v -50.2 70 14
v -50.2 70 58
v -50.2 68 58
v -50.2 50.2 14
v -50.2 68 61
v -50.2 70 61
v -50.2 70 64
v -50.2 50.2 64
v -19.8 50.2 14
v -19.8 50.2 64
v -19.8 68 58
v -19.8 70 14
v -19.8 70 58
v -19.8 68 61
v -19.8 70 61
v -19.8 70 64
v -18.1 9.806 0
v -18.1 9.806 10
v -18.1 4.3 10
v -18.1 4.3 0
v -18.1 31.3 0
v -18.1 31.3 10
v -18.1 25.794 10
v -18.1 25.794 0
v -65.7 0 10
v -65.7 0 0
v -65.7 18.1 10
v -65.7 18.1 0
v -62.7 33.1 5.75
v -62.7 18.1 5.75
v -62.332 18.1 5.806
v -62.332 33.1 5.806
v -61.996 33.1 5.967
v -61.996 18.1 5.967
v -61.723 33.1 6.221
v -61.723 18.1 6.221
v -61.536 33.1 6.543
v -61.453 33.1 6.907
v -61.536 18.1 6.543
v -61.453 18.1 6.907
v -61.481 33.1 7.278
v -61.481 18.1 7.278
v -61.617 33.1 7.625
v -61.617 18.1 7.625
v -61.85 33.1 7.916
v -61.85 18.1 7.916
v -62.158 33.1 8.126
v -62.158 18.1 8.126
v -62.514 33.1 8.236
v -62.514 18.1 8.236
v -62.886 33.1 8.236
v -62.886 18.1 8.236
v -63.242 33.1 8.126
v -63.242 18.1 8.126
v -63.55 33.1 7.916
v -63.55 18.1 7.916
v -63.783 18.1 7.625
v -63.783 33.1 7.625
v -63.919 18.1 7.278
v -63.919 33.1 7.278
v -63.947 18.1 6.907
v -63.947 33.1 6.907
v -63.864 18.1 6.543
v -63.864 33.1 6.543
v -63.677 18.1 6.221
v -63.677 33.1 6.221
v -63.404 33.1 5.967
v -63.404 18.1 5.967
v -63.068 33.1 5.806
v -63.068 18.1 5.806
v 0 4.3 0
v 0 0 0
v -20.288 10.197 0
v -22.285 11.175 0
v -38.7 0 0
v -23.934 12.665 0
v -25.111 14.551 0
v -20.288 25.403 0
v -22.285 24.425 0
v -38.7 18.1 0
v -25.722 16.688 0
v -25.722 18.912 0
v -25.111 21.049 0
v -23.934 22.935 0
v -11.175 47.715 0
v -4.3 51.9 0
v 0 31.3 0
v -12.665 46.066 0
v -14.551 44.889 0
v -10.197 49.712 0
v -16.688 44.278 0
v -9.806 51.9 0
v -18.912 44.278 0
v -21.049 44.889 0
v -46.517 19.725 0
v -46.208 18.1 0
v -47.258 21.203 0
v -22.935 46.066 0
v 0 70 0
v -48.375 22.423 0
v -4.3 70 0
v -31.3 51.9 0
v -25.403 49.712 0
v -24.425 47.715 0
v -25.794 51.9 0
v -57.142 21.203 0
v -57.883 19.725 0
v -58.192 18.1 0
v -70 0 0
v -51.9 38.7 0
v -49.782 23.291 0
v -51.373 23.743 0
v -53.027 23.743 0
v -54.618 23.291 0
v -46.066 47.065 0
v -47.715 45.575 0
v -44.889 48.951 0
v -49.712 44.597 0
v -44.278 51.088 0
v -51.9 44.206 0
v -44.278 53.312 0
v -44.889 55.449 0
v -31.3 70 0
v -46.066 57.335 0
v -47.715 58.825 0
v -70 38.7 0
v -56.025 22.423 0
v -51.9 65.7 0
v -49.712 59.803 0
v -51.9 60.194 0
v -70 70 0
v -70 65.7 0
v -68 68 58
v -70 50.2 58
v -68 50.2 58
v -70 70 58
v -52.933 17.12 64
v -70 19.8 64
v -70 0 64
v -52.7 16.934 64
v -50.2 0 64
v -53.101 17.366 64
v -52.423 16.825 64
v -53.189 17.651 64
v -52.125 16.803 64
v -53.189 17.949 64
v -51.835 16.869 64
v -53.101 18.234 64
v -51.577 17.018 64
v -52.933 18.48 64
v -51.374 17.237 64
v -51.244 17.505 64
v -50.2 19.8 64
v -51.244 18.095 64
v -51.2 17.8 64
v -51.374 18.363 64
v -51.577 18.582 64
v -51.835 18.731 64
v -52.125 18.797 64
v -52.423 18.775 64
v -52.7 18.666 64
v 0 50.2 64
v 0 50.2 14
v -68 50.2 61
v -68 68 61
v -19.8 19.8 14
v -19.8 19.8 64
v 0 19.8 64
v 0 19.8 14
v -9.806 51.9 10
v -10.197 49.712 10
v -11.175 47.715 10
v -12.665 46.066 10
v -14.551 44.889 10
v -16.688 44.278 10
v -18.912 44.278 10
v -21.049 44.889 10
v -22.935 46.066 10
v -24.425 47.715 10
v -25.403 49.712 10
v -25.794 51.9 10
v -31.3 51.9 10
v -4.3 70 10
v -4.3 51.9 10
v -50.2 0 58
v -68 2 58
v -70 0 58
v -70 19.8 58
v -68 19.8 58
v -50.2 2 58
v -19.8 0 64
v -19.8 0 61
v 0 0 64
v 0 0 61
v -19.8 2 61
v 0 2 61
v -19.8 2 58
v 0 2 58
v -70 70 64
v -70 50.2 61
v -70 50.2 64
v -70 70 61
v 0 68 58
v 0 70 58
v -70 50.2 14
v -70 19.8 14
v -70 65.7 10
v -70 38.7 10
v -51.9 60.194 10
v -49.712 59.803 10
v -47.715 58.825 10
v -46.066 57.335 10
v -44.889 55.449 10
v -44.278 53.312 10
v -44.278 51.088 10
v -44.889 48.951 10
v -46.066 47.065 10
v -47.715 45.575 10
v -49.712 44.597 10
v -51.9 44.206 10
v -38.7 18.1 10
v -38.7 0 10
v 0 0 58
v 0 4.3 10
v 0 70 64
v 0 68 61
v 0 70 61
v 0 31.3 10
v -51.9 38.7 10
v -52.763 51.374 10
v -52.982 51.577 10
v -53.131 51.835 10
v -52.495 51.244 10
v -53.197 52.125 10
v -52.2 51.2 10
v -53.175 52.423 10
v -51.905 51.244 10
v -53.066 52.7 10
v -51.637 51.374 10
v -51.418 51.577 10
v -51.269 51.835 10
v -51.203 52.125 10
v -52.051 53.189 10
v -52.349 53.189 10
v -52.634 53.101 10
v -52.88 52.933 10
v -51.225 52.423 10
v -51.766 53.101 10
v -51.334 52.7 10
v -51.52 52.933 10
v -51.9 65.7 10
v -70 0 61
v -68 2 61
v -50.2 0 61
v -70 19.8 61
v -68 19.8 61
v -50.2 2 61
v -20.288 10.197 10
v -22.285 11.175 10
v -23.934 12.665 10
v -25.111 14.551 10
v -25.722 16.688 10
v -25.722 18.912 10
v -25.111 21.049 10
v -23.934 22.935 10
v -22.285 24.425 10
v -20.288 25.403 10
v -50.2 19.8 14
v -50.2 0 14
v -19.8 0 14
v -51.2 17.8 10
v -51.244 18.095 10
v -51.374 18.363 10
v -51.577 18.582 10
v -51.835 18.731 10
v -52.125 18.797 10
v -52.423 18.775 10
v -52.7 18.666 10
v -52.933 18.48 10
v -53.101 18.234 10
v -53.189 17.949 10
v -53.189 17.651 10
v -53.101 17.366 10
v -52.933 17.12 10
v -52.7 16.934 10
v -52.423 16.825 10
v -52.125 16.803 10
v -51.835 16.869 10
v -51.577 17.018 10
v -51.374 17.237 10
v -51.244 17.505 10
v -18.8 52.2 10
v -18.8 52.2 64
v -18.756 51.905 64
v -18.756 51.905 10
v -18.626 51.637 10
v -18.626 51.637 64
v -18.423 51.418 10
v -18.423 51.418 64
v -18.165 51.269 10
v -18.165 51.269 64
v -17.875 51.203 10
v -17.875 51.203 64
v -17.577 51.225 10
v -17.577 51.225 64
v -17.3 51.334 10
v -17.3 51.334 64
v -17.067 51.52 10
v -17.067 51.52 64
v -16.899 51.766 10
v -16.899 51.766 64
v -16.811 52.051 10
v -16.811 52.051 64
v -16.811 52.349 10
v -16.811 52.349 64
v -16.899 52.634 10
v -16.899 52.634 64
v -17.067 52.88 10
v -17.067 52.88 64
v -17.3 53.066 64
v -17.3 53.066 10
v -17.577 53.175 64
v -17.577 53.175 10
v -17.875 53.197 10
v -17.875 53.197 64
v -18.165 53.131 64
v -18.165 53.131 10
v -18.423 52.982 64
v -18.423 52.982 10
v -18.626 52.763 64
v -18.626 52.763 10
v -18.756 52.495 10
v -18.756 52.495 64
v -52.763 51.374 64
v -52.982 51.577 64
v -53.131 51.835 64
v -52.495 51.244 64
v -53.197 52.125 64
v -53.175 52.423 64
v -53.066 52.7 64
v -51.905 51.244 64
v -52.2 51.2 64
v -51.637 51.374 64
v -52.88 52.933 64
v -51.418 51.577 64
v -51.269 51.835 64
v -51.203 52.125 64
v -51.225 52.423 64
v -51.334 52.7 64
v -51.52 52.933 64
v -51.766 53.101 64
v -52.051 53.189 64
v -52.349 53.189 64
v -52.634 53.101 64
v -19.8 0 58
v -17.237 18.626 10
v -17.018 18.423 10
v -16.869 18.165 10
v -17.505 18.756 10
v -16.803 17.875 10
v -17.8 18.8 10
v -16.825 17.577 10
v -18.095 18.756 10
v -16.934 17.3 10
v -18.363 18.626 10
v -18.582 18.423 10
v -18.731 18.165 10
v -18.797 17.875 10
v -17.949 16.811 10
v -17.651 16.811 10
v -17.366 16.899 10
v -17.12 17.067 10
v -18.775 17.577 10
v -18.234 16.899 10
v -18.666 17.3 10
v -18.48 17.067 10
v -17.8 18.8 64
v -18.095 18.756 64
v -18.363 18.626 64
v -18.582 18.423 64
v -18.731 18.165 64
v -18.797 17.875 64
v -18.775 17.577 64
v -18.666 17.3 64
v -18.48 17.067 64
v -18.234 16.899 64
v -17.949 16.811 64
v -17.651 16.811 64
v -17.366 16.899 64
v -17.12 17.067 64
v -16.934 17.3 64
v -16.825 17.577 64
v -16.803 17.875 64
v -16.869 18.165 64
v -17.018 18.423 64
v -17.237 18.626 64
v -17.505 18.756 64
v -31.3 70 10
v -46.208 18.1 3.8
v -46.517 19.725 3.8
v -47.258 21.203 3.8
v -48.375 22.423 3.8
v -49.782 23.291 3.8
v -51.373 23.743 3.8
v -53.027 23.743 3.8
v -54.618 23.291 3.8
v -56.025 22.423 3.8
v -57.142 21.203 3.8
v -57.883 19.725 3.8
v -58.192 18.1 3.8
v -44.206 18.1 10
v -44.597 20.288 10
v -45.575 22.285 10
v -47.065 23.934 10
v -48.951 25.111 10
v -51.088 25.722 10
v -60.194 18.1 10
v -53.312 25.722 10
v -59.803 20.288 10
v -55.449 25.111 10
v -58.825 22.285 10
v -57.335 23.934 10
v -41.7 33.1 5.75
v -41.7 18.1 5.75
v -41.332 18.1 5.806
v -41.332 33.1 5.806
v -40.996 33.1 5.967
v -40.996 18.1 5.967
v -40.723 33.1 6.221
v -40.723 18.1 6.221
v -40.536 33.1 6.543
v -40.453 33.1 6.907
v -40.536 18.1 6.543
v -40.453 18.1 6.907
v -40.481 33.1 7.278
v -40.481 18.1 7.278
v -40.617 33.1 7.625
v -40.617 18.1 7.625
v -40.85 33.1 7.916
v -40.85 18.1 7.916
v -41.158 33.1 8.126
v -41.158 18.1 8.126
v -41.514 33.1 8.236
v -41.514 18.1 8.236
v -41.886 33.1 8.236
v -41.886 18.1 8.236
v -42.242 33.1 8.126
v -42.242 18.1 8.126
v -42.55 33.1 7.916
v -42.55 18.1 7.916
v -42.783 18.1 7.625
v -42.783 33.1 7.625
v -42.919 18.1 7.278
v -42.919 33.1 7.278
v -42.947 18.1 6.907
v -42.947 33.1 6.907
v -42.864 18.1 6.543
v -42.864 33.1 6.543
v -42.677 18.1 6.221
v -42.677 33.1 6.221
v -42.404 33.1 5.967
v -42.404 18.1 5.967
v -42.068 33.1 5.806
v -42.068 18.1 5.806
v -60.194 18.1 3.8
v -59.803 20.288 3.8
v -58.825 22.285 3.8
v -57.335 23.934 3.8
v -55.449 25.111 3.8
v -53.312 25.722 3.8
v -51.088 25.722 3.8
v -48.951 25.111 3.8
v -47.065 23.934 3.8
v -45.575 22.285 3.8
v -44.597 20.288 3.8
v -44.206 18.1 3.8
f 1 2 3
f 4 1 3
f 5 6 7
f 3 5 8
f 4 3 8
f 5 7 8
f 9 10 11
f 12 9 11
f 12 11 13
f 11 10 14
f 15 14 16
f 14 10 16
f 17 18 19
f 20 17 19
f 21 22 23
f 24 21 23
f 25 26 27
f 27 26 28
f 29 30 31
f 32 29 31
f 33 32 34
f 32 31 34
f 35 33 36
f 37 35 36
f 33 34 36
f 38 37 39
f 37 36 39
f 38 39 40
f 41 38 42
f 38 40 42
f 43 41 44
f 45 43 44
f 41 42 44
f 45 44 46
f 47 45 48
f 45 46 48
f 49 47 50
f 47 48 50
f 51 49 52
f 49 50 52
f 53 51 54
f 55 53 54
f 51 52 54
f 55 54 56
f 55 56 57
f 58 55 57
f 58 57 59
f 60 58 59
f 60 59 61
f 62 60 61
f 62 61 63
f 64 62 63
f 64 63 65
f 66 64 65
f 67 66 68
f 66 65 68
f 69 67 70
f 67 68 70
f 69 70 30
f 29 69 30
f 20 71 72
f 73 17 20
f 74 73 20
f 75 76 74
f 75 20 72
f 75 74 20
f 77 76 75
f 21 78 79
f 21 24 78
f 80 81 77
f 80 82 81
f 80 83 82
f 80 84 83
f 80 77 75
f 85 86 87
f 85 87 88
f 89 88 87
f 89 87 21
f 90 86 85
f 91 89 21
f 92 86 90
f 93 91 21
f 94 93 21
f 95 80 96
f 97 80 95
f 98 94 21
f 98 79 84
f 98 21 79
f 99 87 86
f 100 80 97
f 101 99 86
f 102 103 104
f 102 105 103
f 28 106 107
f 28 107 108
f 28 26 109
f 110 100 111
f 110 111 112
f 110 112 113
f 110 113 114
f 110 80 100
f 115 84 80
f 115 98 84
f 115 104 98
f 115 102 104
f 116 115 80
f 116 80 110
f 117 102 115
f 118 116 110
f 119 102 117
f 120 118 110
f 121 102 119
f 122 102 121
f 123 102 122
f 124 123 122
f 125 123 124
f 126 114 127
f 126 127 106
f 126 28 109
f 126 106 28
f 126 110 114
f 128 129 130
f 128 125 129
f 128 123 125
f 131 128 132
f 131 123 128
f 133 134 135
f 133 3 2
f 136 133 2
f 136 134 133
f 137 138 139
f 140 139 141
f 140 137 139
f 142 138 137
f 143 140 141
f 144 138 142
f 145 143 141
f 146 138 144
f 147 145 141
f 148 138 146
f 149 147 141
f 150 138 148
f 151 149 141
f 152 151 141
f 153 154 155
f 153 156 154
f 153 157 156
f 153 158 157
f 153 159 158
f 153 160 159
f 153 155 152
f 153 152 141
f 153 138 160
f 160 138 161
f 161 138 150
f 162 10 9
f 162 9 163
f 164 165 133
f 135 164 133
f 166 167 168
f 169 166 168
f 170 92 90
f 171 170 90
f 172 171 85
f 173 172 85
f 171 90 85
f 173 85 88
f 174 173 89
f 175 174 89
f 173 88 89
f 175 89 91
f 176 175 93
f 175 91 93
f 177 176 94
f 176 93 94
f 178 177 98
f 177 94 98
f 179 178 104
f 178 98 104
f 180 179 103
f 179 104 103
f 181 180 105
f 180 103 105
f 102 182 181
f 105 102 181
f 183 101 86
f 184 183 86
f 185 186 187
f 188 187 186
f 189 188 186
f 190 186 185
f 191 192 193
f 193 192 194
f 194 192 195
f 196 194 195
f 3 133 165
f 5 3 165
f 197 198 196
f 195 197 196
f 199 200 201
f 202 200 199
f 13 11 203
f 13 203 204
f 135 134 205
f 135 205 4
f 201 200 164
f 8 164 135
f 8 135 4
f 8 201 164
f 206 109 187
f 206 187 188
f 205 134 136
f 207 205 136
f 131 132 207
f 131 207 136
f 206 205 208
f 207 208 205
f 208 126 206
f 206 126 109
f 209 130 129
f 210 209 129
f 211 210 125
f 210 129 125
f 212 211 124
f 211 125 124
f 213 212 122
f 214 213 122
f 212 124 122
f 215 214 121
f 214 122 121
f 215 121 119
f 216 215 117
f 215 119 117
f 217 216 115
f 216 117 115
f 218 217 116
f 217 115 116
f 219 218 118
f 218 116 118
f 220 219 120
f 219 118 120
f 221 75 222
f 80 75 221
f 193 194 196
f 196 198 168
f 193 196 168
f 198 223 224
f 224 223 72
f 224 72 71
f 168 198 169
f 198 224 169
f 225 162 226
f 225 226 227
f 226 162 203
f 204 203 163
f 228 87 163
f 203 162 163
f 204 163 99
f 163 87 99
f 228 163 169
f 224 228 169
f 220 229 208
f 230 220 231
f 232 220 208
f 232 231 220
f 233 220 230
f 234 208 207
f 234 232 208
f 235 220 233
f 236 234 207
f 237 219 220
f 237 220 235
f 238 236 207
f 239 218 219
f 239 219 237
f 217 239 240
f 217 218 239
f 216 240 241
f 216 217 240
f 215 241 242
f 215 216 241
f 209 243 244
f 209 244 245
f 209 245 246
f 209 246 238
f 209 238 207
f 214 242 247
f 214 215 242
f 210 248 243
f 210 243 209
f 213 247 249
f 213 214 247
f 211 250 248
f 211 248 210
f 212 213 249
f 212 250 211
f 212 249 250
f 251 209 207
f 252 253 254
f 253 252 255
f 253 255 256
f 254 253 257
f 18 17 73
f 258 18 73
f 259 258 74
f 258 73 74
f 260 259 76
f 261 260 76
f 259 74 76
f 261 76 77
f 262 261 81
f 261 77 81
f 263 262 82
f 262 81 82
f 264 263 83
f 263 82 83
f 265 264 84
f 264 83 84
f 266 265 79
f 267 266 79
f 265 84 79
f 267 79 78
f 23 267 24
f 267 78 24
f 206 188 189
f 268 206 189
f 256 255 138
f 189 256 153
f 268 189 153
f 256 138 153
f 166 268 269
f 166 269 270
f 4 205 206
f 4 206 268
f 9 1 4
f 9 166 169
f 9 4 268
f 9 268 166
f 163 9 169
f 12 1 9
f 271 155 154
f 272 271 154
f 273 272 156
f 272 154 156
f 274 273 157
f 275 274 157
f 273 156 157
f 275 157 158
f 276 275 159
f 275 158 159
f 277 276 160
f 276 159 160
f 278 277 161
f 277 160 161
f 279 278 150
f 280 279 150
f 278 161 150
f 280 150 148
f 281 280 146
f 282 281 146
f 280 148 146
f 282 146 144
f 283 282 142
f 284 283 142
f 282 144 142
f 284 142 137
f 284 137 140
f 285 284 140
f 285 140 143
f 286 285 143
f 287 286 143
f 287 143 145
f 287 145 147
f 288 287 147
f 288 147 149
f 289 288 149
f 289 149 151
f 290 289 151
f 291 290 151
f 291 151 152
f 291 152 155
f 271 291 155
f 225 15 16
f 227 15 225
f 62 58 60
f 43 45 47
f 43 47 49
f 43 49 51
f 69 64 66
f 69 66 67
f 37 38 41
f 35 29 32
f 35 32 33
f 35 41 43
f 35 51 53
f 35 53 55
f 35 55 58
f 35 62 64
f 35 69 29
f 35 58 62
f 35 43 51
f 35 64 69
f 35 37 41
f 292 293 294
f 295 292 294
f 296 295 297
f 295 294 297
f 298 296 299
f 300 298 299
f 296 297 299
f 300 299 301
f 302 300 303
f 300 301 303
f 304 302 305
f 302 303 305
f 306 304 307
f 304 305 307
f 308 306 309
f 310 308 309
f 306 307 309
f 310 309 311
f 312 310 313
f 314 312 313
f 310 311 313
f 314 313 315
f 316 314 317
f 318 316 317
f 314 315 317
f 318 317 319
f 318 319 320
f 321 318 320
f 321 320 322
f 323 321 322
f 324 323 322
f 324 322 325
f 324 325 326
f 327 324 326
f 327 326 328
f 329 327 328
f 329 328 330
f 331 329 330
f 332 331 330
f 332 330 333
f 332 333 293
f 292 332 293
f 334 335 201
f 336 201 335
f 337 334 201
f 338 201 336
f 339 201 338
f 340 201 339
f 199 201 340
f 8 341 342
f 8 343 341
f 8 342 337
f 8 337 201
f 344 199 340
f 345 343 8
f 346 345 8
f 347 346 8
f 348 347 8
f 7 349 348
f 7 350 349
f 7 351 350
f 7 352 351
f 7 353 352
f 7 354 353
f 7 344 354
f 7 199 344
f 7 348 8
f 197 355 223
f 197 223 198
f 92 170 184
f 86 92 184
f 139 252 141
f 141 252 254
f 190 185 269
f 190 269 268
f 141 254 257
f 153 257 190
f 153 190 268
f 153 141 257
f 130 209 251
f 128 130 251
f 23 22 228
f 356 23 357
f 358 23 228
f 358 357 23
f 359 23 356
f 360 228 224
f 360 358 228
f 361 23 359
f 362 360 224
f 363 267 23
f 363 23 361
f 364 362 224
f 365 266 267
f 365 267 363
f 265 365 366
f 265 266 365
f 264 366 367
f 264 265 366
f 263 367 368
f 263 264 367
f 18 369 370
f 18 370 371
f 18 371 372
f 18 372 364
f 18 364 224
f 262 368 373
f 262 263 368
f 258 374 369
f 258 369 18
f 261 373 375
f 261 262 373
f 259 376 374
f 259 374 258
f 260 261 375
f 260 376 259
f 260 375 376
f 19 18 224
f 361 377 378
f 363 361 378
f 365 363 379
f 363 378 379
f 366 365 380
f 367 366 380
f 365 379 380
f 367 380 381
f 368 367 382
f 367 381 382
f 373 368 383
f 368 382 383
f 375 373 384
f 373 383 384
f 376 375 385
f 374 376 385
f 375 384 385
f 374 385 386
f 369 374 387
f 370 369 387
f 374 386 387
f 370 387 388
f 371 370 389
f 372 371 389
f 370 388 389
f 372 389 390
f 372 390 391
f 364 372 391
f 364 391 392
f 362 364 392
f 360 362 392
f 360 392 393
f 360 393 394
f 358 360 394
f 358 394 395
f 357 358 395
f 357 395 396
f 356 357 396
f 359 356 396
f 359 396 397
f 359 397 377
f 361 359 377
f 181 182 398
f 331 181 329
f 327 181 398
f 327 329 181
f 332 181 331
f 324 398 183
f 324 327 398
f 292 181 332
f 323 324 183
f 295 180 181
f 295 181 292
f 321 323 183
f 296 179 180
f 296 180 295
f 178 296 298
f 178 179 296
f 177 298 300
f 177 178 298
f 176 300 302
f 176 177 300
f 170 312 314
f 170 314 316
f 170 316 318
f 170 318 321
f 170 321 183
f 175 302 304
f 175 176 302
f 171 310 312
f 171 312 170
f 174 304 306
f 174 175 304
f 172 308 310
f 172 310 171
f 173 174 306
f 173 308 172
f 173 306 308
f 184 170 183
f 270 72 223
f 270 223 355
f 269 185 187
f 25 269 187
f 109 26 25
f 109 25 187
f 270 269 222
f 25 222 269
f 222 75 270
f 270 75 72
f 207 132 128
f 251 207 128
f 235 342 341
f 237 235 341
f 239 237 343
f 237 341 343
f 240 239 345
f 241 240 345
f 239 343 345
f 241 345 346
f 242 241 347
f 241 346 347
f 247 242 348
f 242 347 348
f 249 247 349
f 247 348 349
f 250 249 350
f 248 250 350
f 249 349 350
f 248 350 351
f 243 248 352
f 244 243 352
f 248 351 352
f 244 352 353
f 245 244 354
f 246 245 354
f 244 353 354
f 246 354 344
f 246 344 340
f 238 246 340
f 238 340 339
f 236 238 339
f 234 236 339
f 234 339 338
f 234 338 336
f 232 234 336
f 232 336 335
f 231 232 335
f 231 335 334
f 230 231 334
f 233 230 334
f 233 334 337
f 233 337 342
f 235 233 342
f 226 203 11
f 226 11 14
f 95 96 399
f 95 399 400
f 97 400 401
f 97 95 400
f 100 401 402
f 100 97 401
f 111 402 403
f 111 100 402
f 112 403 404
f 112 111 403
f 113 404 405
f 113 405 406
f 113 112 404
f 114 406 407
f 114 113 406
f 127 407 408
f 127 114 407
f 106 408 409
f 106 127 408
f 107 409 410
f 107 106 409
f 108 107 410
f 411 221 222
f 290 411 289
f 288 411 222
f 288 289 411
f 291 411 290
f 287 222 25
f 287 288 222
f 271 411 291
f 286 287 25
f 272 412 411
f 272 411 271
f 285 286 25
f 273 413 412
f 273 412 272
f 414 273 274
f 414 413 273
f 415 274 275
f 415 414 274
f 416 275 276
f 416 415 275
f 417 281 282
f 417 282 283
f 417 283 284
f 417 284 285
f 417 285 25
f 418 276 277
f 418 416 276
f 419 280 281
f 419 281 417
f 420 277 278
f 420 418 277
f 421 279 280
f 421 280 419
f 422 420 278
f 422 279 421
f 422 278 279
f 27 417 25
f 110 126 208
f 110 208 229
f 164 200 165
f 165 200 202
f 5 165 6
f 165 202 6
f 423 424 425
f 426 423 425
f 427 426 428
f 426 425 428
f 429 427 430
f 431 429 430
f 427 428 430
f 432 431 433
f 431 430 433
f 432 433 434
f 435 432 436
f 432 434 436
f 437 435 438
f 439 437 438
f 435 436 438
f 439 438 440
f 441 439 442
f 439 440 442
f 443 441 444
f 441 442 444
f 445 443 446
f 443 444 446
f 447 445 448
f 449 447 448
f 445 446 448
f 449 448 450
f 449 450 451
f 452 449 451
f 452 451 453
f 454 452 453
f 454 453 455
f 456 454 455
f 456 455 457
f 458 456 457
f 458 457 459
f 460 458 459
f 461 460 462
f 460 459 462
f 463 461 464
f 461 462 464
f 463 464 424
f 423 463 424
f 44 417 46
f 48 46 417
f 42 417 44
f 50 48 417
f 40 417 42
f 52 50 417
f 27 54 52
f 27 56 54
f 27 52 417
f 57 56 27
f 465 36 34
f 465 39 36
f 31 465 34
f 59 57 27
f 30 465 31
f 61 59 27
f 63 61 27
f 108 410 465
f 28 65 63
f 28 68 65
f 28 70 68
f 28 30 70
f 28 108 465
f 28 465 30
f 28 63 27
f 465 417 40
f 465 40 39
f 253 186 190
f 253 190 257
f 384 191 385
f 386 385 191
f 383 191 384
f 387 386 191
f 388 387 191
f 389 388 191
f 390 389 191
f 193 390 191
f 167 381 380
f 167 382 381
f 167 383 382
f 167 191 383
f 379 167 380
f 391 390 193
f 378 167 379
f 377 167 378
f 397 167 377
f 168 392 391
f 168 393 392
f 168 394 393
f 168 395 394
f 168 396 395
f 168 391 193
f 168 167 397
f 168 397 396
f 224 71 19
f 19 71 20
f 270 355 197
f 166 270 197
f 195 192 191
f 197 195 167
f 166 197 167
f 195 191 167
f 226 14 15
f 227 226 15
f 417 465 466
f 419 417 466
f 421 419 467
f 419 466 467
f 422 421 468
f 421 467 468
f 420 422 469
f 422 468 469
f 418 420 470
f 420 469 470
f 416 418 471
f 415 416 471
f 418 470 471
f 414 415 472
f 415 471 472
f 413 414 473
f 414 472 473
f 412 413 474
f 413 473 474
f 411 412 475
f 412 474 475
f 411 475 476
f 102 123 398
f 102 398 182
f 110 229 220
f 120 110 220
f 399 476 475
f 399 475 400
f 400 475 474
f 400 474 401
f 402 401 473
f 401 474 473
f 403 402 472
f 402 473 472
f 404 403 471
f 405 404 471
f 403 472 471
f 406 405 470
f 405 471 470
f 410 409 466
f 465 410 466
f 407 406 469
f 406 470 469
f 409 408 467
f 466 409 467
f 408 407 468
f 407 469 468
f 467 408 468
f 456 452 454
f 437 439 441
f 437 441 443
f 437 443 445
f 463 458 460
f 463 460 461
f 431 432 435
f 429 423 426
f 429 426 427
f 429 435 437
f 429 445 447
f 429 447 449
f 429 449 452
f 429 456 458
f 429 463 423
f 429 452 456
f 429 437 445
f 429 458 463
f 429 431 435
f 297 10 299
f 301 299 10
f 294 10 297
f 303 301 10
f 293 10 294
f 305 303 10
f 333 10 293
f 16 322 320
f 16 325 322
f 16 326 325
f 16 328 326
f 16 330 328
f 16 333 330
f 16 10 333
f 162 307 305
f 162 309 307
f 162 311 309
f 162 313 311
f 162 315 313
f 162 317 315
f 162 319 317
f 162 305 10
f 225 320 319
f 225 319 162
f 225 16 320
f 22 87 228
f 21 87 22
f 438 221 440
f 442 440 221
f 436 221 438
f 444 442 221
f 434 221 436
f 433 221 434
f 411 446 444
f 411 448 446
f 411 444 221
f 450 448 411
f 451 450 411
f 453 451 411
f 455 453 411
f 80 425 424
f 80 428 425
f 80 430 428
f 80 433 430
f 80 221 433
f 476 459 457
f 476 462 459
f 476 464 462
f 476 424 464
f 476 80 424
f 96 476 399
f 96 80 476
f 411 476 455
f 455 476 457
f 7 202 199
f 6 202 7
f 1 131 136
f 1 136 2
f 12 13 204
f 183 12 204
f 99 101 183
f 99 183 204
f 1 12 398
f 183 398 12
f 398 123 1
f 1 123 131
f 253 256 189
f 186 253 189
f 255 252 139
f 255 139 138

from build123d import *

# Parameters (mm, degrees)
ESQUISSE1_W                  = 70
ESQUISSE1_H                  = 70
BOSS_EXTRU_1_DEPTH           = 64
ESQUISSE2_W                  = 30.4
ESQUISSE2_H                  = 19.8
ESQUISSE2_H_2                = 30.4
ESQUISSE2_W_2                = 19.8
ENL_V_MAT_EXTRU_1_DEPTH      = 50
ESQUISSE5_W                  = 3
ESQUISSE5_H                  = 2
ENL_V_MAT_EXTRU_3_DEPTH      = 71
ESQUISSE6_W                  = 2
ESQUISSE6_H                  = 3
ENL_V_MAT_EXTRU_4_DEPTH      = 71
ESQUISSE7_R                  = 1
ENL_V_MAT_EXTRU_5_DEPTH      = 65
ENL_V_MAT_EXTRU_7_DEPTH      = 10
BOSS_EXTRU_2_DEPTH           = 3.8
ESQUISSE10_W                 = 27
ESQUISSE10_H                 = 18.1
ENL_V_MAT_EXTRU_8_DEPTH      = 10
ESQUISSE11_R                 = 1.25
ENL_V_MAT_EXTRU_9_DEPTH      = 15
R_P_TITION_CIRCULAIRE1_COUNT = 4


with BuildPart() as part:
    # Esquisse1 → Boss.-Extru.1 (new body)
    with BuildSketch(Plane.XY):
        with Locations((-35, 35)):
            Rectangle(ESQUISSE1_W, ESQUISSE1_H)
    extrude(amount=BOSS_EXTRU_1_DEPTH)

    # Esquisse2 → Enlèv. mat.-Extru.1 (cut)
    with BuildSketch(Plane.XY.offset(64)):
        with Locations((-35, 60.1)):
            Rectangle(ESQUISSE2_W, ESQUISSE2_H)
        with Locations((-35, 35)):
            Rectangle(ESQUISSE2_W, ESQUISSE2_H_2)
        with Locations((-9.9, 35)):
            Rectangle(ESQUISSE2_W_2, ESQUISSE2_H_2)
        with Locations((-60.1, 35)):
            Rectangle(ESQUISSE2_W_2, ESQUISSE2_H_2)
        with Locations((-35, 9.9)):
            Rectangle(ESQUISSE2_W, ESQUISSE2_H)
    extrude(amount=-ENL_V_MAT_EXTRU_1_DEPTH, mode=Mode.SUBTRACT)

    # Esquisse5 → Enlèv. mat.-Extru.3 (cut, through all)
    with BuildSketch(Plane.ZY.offset(70)):
        with Locations((59.5, 69)):
            Rectangle(ESQUISSE5_W, ESQUISSE5_H)
        with Locations((59.5, 1)):
            Rectangle(ESQUISSE5_W, ESQUISSE5_H)
    extrude(amount=-ENL_V_MAT_EXTRU_3_DEPTH, mode=Mode.SUBTRACT)

    # Esquisse6 → Enlèv. mat.-Extru.4 (cut, through all)
    with BuildSketch(Plane(origin=(0, 70, 0), x_dir=(1, 0, 0), z_dir=(0, 1, 0))):
        with Locations((-69, -59.5)):
            Rectangle(ESQUISSE6_W, ESQUISSE6_H)
    extrude(amount=-ENL_V_MAT_EXTRU_4_DEPTH, mode=Mode.SUBTRACT)

    # Esquisse7 → Enlèv. mat.-Extru.5 (cut, through all)
    with BuildSketch(Plane.XY.offset(64)):
        with Locations((-52.2, 17.8)):
            Circle(ESQUISSE7_R)
    enl_v_mat_extru_5 = extrude(amount=-ENL_V_MAT_EXTRU_5_DEPTH, mode=Mode.SUBTRACT)

    # Esquisse8 → Enlèv. mat.-Extru.7 (cut)
    with BuildSketch(Plane(origin=(0, 0, 0), x_dir=(-1, 0, 0), z_dir=(0, 0, -1))):
        with BuildLine():
            Line((60.2, 0), (60.2, 17.8))
            ThreePointArc((60.2, 17.8), (52.2, 9.8), (44.2, 17.8))
            Line((44.2, 17.8), (44.2, 0))
            Line((44.2, 0), (60.2, 0))
        make_face()
        with BuildLine():
            ThreePointArc((44.2, 17.8), (52.2, 9.8), (60.2, 17.8))
            Line((60.2, 17.8), (53.2, 17.8))
            ThreePointArc((53.2, 17.8), (52.2, 16.8), (51.2, 17.8))
            Line((51.2, 17.8), (44.2, 17.8))
        make_face()
        with BuildLine():
            Line((53.2, 17.8), (60.2, 17.8))
            ThreePointArc((60.2, 17.8), (52.2, 25.8), (44.2, 17.8))
            Line((44.2, 17.8), (51.2, 17.8))
            ThreePointArc((51.2, 17.8), (52.2, 18.8), (53.2, 17.8))
        make_face()
    enl_v_mat_extru_7 = extrude(amount=-ENL_V_MAT_EXTRU_7_DEPTH, mode=Mode.SUBTRACT)

    # Esquisse9 → Boss.-Extru.2 (add)
    with BuildSketch(Plane(origin=(0, 0, 0), x_dir=(-1, 0, 0), z_dir=(0, 0, -1))):
        with BuildLine():
            Line((46.2, 0), (46.2, 17.8))
            ThreePointArc((46.2, 17.8), (52.2, 23.8), (58.2, 17.8))
            Line((58.2, 17.8), (58.2, 0))
            Line((58.2, 0), (60.2, 0))
            Line((60.2, 0), (60.2, 17.8))
            Line((60.2, 17.8), (60.175717696, 28.742363645))
            Line((60.175717696, 28.742363645), (44.2, 28.742363645))
            Line((44.2, 28.742363645), (44.2, 0))
            Line((44.2, 0), (46.2, 0))
        make_face()
    extrude(amount=-BOSS_EXTRU_2_DEPTH)

    # Esquisse10 → Enlèv. mat.-Extru.8 (cut)
    with BuildSketch(Plane(origin=(0, 0, 0), x_dir=(-1, 0, 0), z_dir=(0, 0, -1))):
        with Locations((52.2, 9.05)):
            Rectangle(ESQUISSE10_W, ESQUISSE10_H)
    enl_v_mat_extru_8 = extrude(amount=-ENL_V_MAT_EXTRU_8_DEPTH, mode=Mode.SUBTRACT)

    # Esquisse11 → Enlèv. mat.-Extru.9 (cut)
    with BuildSketch(Plane.XZ.offset(-18.1)):
        with Locations(Location((-41.7, 7, 0), (0, 0, 270))):  # turned: the seam where the file's is
            Circle(ESQUISSE11_R)
        with Locations(Location((-62.7, 7, 0), (0, 0, 270))):  # turned: the seam where the file's is
            Circle(ESQUISSE11_R)
    extrude(amount=-ENL_V_MAT_EXTRU_9_DEPTH, mode=Mode.SUBTRACT)

    # Répétition circulaire1: Enlèv. mat.-Extru.5, Enlèv. mat.-Extru.7, Enlèv. mat.-Extru.8 ×4 about axis
    r_p_tition_circulaire1_axis = Axis((-35, 35, 0), (0, 0, 1))
    add([enl_v_mat_extru_5.rotate(r_p_tition_circulaire1_axis, i * 360 / R_P_TITION_CIRCULAIRE1_COUNT) for i in range(1, R_P_TITION_CIRCULAIRE1_COUNT)], mode=Mode.SUBTRACT)
    add([enl_v_mat_extru_7.rotate(r_p_tition_circulaire1_axis, i * 360 / R_P_TITION_CIRCULAIRE1_COUNT) for i in range(1, R_P_TITION_CIRCULAIRE1_COUNT)], mode=Mode.SUBTRACT)
    add([enl_v_mat_extru_8.rotate(r_p_tition_circulaire1_axis, i * 360 / R_P_TITION_CIRCULAIRE1_COUNT) for i in range(1, R_P_TITION_CIRCULAIRE1_COUNT)], mode=Mode.SUBTRACT)


solid = part.part
